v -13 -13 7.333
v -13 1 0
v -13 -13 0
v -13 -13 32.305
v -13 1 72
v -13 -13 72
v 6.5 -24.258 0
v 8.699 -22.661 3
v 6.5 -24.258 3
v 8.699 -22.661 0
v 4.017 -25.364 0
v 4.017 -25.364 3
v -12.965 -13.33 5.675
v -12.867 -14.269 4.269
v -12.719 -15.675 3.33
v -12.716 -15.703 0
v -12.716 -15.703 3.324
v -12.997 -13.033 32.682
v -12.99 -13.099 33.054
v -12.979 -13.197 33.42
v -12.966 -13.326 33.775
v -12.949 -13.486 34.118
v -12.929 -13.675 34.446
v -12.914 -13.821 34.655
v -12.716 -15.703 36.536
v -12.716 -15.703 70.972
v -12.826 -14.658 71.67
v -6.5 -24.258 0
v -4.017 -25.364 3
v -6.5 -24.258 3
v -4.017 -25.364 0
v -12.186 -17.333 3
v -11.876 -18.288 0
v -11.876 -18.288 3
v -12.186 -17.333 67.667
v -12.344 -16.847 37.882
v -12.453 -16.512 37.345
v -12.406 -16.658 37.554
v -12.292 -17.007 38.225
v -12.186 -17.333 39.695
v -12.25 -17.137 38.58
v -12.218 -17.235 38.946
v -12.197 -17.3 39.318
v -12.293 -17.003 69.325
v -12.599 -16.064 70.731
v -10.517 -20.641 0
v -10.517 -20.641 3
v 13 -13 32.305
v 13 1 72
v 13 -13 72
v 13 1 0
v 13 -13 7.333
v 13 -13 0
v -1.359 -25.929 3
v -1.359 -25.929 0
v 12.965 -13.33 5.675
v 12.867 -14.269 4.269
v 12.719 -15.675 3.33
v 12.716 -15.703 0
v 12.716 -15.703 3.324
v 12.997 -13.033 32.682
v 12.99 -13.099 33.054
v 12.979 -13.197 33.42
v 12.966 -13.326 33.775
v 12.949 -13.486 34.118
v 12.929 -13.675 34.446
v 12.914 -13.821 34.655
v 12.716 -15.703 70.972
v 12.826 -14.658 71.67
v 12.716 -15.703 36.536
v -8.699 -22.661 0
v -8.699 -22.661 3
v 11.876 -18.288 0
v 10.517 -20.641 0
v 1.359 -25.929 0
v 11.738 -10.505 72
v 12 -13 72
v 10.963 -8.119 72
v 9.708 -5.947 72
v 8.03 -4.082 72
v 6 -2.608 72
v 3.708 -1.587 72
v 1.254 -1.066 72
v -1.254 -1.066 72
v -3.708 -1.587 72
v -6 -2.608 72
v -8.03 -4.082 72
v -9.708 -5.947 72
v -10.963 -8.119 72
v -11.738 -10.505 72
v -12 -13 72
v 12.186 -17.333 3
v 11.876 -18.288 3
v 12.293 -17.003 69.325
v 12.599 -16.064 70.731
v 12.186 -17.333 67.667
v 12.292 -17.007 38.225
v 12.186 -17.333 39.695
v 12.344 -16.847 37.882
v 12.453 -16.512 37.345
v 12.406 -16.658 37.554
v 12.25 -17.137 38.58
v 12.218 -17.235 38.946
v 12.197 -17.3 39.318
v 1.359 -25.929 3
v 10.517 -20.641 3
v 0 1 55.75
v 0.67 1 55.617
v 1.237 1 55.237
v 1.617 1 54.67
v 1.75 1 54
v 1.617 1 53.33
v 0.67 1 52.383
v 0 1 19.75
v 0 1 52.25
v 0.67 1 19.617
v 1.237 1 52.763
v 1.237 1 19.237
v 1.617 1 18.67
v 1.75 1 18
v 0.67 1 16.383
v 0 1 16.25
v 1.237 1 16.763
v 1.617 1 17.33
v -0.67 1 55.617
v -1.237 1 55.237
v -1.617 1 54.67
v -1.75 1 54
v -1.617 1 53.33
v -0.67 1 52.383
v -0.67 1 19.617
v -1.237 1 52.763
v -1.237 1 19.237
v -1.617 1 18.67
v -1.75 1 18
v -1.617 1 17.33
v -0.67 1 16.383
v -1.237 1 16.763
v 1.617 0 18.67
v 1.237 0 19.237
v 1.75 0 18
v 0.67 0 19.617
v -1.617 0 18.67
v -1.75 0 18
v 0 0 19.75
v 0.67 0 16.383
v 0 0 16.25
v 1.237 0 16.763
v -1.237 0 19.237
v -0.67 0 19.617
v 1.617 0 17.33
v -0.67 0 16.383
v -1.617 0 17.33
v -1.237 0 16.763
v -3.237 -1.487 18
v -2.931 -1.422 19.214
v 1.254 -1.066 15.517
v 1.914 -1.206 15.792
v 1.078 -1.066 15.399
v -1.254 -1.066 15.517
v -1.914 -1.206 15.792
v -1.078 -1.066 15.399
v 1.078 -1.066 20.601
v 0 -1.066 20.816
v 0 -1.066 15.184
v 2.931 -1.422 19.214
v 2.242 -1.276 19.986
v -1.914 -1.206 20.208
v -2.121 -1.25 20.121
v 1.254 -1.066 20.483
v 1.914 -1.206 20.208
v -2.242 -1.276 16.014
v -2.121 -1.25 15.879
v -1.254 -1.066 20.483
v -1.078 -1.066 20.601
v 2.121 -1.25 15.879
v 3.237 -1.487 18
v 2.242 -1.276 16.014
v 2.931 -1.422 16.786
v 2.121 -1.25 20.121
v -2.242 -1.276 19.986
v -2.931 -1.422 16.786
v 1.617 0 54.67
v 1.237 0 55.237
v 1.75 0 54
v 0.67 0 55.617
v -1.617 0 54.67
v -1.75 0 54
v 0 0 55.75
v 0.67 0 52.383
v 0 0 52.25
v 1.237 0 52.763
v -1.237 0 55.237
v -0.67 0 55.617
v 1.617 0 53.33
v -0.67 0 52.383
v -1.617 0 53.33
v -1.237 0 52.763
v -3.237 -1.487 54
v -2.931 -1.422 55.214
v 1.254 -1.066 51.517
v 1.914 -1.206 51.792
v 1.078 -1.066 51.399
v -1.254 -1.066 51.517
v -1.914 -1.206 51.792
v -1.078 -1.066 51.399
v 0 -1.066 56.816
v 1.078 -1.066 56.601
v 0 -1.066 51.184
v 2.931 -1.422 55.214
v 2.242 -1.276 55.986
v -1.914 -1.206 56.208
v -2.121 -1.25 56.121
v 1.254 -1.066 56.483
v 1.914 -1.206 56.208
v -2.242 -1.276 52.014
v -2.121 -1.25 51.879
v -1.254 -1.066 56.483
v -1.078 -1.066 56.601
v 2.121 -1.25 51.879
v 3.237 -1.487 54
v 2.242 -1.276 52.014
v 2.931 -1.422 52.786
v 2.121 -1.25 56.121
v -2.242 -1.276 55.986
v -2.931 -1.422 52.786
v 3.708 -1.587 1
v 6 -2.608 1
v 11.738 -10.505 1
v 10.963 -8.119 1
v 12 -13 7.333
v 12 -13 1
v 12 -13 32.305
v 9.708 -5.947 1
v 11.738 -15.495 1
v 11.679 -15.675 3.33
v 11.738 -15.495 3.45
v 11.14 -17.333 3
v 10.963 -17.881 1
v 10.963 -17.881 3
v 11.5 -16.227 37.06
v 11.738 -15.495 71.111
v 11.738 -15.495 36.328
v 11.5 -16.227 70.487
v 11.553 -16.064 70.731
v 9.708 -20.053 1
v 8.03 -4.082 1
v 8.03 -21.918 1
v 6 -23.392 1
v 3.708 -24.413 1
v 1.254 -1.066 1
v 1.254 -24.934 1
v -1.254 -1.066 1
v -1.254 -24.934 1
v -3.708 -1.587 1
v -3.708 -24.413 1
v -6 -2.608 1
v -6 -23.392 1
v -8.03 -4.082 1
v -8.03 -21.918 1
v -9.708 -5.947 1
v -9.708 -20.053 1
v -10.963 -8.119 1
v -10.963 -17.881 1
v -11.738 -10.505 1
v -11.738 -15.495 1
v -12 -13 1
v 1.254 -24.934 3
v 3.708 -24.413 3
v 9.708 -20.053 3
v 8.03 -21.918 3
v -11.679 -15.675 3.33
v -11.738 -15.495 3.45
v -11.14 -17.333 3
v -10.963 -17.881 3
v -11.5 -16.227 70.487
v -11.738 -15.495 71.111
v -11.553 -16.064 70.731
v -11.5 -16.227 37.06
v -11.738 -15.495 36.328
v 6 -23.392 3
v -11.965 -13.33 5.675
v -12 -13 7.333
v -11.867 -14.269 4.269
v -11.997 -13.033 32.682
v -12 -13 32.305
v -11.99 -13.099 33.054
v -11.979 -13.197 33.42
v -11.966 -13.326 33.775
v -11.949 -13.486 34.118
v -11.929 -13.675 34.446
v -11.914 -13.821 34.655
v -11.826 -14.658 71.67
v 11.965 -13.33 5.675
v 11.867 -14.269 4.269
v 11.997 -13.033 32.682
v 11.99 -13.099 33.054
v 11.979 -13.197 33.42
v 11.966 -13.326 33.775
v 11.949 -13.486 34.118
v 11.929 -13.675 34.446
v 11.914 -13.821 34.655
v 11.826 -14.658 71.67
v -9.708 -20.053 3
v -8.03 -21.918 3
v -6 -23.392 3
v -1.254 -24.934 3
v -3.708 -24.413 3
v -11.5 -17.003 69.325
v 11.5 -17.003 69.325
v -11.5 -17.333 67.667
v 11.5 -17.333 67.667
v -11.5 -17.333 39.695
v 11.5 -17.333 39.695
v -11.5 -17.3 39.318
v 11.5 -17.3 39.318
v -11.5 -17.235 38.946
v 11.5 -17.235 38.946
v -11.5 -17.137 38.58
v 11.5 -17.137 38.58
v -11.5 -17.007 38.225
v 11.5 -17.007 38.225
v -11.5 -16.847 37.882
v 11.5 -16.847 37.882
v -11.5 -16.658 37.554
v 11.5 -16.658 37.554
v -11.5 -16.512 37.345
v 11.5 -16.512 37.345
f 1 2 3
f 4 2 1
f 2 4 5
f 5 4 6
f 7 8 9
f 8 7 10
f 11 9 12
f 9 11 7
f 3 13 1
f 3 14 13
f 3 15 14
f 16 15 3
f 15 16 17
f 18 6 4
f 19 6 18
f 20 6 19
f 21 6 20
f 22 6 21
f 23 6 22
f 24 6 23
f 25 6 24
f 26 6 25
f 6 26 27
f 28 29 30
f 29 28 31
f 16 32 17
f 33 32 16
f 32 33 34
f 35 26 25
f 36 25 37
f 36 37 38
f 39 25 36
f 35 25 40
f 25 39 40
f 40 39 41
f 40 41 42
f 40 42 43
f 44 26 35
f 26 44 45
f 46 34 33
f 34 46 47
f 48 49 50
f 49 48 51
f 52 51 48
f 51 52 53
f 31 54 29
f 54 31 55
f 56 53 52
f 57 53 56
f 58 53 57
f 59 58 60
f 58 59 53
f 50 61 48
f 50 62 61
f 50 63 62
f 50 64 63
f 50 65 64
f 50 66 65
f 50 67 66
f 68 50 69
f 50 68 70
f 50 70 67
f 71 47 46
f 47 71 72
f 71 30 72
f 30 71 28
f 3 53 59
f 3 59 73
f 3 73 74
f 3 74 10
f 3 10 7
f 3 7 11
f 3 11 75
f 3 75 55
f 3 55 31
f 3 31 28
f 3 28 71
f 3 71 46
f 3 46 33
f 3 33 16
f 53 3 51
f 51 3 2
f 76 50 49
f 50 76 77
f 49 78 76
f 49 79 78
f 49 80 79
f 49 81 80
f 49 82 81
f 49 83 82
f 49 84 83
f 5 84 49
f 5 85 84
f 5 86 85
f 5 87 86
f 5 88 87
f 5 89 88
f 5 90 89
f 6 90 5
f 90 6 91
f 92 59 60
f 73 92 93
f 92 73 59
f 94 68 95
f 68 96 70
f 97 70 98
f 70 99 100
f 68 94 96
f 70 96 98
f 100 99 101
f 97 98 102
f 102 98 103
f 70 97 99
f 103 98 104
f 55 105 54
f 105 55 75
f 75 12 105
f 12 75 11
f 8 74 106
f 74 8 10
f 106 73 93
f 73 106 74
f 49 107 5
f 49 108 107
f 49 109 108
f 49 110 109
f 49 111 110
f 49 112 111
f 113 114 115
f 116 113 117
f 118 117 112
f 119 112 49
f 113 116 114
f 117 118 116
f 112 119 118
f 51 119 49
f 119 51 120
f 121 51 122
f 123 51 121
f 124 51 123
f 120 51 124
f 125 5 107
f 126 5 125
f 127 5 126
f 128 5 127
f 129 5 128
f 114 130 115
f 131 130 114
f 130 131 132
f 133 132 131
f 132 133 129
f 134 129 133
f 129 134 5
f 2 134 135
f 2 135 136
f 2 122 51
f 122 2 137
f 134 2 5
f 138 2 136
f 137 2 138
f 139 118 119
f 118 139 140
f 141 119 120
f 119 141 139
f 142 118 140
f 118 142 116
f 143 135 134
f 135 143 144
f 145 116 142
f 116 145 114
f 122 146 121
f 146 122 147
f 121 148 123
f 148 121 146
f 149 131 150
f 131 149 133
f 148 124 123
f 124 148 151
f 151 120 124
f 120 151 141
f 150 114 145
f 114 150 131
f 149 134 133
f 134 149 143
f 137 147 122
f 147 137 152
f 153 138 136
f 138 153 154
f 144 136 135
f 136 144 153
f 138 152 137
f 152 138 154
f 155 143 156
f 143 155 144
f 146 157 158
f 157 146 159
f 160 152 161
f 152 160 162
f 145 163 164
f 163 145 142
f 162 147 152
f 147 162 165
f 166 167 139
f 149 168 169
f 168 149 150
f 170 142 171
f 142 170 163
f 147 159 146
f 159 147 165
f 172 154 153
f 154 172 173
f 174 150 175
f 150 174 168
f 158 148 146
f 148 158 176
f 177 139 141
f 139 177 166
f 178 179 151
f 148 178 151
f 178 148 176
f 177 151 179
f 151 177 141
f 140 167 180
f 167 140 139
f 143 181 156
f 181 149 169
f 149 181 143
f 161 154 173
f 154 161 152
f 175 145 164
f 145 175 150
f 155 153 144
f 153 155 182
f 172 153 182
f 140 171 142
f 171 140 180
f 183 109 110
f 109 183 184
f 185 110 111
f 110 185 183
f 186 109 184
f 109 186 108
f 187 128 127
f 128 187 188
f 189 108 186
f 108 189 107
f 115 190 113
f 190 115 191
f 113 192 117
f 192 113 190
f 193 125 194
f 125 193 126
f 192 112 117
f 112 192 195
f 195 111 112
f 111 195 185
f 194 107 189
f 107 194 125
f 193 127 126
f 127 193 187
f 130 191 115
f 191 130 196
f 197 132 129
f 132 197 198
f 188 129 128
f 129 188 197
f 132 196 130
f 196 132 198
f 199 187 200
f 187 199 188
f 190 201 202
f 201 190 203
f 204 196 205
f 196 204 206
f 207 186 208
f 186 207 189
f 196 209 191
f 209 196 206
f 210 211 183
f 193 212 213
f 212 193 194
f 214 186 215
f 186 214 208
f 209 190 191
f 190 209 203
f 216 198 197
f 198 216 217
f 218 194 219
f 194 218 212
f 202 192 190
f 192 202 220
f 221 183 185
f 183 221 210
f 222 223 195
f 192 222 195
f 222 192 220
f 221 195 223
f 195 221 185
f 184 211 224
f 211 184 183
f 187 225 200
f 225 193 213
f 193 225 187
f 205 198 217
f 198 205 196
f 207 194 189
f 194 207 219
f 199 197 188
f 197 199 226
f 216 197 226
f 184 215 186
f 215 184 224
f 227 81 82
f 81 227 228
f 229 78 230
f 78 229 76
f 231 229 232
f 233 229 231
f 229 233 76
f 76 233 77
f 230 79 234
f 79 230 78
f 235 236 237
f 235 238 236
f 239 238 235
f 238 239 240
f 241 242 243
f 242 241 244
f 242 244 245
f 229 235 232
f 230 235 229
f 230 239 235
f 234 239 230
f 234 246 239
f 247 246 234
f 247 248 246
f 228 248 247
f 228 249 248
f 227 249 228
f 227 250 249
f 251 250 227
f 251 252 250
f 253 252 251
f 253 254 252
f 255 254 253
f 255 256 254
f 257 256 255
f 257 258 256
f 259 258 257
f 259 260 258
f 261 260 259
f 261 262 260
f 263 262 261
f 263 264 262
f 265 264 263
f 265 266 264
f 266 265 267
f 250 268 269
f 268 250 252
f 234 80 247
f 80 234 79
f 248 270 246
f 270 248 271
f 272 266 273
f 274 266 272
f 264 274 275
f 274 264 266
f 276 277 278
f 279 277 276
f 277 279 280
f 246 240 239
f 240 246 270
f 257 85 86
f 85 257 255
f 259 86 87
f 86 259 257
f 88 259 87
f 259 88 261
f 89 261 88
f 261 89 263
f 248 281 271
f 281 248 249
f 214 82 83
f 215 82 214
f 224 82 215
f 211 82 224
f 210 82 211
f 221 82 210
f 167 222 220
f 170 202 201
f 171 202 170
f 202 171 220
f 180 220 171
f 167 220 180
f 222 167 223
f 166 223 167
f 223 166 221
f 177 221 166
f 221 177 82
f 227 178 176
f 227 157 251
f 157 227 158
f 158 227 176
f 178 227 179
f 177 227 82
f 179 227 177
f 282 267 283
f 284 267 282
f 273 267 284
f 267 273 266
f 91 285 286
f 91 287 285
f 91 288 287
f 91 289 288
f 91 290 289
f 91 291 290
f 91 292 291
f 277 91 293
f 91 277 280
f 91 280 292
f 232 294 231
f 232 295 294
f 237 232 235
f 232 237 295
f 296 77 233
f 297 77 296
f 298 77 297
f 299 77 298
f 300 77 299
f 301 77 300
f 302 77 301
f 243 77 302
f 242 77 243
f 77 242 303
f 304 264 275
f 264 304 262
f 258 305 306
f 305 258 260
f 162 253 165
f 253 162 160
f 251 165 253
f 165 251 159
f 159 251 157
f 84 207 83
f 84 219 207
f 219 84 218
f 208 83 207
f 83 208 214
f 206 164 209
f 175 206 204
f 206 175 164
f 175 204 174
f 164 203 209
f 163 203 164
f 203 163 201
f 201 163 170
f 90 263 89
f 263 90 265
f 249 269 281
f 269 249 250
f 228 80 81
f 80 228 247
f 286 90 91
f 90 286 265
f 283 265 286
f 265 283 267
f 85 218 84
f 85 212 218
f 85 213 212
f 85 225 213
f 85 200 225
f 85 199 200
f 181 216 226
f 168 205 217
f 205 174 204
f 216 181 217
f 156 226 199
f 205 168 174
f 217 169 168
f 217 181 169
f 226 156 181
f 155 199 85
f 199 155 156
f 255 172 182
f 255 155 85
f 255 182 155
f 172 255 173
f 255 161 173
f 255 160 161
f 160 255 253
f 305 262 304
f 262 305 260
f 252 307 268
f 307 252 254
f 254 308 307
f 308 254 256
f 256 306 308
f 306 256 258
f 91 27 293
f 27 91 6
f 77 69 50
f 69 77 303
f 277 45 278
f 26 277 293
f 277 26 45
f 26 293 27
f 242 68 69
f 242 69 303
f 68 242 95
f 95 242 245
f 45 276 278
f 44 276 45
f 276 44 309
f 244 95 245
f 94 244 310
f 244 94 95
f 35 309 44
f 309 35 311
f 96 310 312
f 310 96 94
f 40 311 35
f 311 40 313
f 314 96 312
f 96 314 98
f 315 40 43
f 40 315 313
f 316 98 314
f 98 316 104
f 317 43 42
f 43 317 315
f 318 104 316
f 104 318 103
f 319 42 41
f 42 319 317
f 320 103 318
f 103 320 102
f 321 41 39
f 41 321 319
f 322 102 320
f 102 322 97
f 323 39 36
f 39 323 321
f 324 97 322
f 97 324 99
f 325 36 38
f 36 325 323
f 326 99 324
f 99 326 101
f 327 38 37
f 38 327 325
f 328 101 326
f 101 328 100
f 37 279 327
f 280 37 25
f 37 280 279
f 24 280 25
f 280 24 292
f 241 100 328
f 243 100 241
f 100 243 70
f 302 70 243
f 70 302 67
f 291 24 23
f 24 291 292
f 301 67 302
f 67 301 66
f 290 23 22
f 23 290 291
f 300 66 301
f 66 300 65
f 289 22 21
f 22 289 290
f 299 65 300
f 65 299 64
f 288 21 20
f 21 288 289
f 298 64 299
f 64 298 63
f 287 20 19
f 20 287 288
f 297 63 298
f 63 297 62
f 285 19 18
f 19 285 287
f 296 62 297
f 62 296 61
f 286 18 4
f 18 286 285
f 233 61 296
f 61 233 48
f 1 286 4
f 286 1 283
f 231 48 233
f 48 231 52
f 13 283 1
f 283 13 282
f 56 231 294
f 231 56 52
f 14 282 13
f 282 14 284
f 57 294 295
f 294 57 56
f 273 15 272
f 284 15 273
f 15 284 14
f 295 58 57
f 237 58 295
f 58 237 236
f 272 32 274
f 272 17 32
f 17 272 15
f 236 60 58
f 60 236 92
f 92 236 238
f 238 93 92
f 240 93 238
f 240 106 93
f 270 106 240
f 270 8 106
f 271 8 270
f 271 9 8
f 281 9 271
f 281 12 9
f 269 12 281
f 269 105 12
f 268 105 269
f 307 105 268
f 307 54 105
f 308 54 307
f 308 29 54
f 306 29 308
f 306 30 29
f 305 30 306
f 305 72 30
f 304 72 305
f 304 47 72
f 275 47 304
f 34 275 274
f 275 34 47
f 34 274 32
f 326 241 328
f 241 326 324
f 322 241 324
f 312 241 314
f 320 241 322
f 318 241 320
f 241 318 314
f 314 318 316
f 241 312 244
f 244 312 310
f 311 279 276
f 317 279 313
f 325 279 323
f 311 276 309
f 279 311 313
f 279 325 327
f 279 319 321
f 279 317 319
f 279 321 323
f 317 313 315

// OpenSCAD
//Diameter of cigarette
cigarete_diameter = 24; //[10:30]

//Length of holder
holder_length = 70; //[40:100]

//Thikness of holder walls
wall_thikness = 1; //[1:3]

//Mount holes diameter
holes_diameter = 3.5; //[2:5]

// in n*wall_thikness
//angle_round = 3; //[1-6]


/*[Hidden]*/
ed=cigarete_diameter;
el=holder_length;
w=wall_thikness;
//dr=angle_round;

m4d = holes_diameter;


tw = ed+w*2;
tl = el+w*2;
dn_h = w*3;
up_h = w*6;
b_dpth = tw/2;


holder();


module shape5(){
	x1 = tw; 
	x2 = b_dpth;
	x3 = tw*2/3;
	r1 = x3-x2;
	r2 = r1/2;
	dr = (x3-x2)/2;
	r = r1;
	y1 = dn_h;
	y2 = tl/2;
	y4 = tl;
	union(){
		difference(){
			polygon(points=[
				[x1,y1],[x2+r,y1],[x2,y1+r],[x2,y2-r/2],[x3,y2+r/2],[x3,y4-r],[x2,y4],[x2,y4+1],[x1,y4+1]
				],path=[0,1,2,3,4,5,6,7,8]
			);
			translate([x2+r,y2-r+(r/2)/sqrt(2)-r/4])
				for(i=[0:5:45]){
					rotate([0,0,-i])
						translate([-r-r/4,0])
							square([r/2,r],true);
			}
			translate([x2,y4-r])
				circle(r, $fn=16);
		}
		translate([x2+r,y1+r])
			circle(r, $fn=16);
		for(i=[0:5:45]){
			translate([x3-r,y2+r-(r/2)/sqrt(2)+r/4])
				rotate([0,0,-i])
					translate([r+r/4,0])
						square([r/2,r],true);
		}
	}
}



module shape(){
//	hull()
	difference(){
		square([tw,tl]);
		shape2();
	}
}

module holder(){
	translate([0,-tw/4,0])
		difference(){
			union(){
				linear_extrude(height=tl, convexity = 2){
					square([tw,tw/2],true);
					translate([0,-tw/4])
						circle(r=tw/2);		
				}
				translate([-tw/2,tw/4,0])
					cube([tw,w,tl]);			
			}
			translate([0,-tw/4,w])
				cylinder(r=ed/2,h=tl);
	//		translate([-tw/2-1,-tw,w*3])
	//			#cube([tw+2,tw,tl*3/4]);
			rotate([90,0,-90])
				translate([-tw/4,0,-tw/2-1])
				linear_extrude(height=tw+2, convexity = 2)
					shape5();
			for(i=[tl/4,tl*3/4])
				translate([0,tw/4,i])
					rotate([90,0,0])
						hole(m4d);
			assign(lnth=ed-w)
			translate([-lnth/2,-tw*3/4,tl/3])
				cube([lnth,tw/2,tl*2/3+1]);
		}
}

module hole(diam){
	l1=w*5;
	l2=diam/2;
	l3=w*5;
	translate([0,0,-l1])
		cylinder(r=diam/2, h=l1+1, $fn=16);
	translate([0,0,0])
		cylinder(r1=diam/2, r2=diam, h=l2, $fn=16);
	translate([0,0,l2])
		cylinder(r=diam, h=l3, $fn=16);
}
